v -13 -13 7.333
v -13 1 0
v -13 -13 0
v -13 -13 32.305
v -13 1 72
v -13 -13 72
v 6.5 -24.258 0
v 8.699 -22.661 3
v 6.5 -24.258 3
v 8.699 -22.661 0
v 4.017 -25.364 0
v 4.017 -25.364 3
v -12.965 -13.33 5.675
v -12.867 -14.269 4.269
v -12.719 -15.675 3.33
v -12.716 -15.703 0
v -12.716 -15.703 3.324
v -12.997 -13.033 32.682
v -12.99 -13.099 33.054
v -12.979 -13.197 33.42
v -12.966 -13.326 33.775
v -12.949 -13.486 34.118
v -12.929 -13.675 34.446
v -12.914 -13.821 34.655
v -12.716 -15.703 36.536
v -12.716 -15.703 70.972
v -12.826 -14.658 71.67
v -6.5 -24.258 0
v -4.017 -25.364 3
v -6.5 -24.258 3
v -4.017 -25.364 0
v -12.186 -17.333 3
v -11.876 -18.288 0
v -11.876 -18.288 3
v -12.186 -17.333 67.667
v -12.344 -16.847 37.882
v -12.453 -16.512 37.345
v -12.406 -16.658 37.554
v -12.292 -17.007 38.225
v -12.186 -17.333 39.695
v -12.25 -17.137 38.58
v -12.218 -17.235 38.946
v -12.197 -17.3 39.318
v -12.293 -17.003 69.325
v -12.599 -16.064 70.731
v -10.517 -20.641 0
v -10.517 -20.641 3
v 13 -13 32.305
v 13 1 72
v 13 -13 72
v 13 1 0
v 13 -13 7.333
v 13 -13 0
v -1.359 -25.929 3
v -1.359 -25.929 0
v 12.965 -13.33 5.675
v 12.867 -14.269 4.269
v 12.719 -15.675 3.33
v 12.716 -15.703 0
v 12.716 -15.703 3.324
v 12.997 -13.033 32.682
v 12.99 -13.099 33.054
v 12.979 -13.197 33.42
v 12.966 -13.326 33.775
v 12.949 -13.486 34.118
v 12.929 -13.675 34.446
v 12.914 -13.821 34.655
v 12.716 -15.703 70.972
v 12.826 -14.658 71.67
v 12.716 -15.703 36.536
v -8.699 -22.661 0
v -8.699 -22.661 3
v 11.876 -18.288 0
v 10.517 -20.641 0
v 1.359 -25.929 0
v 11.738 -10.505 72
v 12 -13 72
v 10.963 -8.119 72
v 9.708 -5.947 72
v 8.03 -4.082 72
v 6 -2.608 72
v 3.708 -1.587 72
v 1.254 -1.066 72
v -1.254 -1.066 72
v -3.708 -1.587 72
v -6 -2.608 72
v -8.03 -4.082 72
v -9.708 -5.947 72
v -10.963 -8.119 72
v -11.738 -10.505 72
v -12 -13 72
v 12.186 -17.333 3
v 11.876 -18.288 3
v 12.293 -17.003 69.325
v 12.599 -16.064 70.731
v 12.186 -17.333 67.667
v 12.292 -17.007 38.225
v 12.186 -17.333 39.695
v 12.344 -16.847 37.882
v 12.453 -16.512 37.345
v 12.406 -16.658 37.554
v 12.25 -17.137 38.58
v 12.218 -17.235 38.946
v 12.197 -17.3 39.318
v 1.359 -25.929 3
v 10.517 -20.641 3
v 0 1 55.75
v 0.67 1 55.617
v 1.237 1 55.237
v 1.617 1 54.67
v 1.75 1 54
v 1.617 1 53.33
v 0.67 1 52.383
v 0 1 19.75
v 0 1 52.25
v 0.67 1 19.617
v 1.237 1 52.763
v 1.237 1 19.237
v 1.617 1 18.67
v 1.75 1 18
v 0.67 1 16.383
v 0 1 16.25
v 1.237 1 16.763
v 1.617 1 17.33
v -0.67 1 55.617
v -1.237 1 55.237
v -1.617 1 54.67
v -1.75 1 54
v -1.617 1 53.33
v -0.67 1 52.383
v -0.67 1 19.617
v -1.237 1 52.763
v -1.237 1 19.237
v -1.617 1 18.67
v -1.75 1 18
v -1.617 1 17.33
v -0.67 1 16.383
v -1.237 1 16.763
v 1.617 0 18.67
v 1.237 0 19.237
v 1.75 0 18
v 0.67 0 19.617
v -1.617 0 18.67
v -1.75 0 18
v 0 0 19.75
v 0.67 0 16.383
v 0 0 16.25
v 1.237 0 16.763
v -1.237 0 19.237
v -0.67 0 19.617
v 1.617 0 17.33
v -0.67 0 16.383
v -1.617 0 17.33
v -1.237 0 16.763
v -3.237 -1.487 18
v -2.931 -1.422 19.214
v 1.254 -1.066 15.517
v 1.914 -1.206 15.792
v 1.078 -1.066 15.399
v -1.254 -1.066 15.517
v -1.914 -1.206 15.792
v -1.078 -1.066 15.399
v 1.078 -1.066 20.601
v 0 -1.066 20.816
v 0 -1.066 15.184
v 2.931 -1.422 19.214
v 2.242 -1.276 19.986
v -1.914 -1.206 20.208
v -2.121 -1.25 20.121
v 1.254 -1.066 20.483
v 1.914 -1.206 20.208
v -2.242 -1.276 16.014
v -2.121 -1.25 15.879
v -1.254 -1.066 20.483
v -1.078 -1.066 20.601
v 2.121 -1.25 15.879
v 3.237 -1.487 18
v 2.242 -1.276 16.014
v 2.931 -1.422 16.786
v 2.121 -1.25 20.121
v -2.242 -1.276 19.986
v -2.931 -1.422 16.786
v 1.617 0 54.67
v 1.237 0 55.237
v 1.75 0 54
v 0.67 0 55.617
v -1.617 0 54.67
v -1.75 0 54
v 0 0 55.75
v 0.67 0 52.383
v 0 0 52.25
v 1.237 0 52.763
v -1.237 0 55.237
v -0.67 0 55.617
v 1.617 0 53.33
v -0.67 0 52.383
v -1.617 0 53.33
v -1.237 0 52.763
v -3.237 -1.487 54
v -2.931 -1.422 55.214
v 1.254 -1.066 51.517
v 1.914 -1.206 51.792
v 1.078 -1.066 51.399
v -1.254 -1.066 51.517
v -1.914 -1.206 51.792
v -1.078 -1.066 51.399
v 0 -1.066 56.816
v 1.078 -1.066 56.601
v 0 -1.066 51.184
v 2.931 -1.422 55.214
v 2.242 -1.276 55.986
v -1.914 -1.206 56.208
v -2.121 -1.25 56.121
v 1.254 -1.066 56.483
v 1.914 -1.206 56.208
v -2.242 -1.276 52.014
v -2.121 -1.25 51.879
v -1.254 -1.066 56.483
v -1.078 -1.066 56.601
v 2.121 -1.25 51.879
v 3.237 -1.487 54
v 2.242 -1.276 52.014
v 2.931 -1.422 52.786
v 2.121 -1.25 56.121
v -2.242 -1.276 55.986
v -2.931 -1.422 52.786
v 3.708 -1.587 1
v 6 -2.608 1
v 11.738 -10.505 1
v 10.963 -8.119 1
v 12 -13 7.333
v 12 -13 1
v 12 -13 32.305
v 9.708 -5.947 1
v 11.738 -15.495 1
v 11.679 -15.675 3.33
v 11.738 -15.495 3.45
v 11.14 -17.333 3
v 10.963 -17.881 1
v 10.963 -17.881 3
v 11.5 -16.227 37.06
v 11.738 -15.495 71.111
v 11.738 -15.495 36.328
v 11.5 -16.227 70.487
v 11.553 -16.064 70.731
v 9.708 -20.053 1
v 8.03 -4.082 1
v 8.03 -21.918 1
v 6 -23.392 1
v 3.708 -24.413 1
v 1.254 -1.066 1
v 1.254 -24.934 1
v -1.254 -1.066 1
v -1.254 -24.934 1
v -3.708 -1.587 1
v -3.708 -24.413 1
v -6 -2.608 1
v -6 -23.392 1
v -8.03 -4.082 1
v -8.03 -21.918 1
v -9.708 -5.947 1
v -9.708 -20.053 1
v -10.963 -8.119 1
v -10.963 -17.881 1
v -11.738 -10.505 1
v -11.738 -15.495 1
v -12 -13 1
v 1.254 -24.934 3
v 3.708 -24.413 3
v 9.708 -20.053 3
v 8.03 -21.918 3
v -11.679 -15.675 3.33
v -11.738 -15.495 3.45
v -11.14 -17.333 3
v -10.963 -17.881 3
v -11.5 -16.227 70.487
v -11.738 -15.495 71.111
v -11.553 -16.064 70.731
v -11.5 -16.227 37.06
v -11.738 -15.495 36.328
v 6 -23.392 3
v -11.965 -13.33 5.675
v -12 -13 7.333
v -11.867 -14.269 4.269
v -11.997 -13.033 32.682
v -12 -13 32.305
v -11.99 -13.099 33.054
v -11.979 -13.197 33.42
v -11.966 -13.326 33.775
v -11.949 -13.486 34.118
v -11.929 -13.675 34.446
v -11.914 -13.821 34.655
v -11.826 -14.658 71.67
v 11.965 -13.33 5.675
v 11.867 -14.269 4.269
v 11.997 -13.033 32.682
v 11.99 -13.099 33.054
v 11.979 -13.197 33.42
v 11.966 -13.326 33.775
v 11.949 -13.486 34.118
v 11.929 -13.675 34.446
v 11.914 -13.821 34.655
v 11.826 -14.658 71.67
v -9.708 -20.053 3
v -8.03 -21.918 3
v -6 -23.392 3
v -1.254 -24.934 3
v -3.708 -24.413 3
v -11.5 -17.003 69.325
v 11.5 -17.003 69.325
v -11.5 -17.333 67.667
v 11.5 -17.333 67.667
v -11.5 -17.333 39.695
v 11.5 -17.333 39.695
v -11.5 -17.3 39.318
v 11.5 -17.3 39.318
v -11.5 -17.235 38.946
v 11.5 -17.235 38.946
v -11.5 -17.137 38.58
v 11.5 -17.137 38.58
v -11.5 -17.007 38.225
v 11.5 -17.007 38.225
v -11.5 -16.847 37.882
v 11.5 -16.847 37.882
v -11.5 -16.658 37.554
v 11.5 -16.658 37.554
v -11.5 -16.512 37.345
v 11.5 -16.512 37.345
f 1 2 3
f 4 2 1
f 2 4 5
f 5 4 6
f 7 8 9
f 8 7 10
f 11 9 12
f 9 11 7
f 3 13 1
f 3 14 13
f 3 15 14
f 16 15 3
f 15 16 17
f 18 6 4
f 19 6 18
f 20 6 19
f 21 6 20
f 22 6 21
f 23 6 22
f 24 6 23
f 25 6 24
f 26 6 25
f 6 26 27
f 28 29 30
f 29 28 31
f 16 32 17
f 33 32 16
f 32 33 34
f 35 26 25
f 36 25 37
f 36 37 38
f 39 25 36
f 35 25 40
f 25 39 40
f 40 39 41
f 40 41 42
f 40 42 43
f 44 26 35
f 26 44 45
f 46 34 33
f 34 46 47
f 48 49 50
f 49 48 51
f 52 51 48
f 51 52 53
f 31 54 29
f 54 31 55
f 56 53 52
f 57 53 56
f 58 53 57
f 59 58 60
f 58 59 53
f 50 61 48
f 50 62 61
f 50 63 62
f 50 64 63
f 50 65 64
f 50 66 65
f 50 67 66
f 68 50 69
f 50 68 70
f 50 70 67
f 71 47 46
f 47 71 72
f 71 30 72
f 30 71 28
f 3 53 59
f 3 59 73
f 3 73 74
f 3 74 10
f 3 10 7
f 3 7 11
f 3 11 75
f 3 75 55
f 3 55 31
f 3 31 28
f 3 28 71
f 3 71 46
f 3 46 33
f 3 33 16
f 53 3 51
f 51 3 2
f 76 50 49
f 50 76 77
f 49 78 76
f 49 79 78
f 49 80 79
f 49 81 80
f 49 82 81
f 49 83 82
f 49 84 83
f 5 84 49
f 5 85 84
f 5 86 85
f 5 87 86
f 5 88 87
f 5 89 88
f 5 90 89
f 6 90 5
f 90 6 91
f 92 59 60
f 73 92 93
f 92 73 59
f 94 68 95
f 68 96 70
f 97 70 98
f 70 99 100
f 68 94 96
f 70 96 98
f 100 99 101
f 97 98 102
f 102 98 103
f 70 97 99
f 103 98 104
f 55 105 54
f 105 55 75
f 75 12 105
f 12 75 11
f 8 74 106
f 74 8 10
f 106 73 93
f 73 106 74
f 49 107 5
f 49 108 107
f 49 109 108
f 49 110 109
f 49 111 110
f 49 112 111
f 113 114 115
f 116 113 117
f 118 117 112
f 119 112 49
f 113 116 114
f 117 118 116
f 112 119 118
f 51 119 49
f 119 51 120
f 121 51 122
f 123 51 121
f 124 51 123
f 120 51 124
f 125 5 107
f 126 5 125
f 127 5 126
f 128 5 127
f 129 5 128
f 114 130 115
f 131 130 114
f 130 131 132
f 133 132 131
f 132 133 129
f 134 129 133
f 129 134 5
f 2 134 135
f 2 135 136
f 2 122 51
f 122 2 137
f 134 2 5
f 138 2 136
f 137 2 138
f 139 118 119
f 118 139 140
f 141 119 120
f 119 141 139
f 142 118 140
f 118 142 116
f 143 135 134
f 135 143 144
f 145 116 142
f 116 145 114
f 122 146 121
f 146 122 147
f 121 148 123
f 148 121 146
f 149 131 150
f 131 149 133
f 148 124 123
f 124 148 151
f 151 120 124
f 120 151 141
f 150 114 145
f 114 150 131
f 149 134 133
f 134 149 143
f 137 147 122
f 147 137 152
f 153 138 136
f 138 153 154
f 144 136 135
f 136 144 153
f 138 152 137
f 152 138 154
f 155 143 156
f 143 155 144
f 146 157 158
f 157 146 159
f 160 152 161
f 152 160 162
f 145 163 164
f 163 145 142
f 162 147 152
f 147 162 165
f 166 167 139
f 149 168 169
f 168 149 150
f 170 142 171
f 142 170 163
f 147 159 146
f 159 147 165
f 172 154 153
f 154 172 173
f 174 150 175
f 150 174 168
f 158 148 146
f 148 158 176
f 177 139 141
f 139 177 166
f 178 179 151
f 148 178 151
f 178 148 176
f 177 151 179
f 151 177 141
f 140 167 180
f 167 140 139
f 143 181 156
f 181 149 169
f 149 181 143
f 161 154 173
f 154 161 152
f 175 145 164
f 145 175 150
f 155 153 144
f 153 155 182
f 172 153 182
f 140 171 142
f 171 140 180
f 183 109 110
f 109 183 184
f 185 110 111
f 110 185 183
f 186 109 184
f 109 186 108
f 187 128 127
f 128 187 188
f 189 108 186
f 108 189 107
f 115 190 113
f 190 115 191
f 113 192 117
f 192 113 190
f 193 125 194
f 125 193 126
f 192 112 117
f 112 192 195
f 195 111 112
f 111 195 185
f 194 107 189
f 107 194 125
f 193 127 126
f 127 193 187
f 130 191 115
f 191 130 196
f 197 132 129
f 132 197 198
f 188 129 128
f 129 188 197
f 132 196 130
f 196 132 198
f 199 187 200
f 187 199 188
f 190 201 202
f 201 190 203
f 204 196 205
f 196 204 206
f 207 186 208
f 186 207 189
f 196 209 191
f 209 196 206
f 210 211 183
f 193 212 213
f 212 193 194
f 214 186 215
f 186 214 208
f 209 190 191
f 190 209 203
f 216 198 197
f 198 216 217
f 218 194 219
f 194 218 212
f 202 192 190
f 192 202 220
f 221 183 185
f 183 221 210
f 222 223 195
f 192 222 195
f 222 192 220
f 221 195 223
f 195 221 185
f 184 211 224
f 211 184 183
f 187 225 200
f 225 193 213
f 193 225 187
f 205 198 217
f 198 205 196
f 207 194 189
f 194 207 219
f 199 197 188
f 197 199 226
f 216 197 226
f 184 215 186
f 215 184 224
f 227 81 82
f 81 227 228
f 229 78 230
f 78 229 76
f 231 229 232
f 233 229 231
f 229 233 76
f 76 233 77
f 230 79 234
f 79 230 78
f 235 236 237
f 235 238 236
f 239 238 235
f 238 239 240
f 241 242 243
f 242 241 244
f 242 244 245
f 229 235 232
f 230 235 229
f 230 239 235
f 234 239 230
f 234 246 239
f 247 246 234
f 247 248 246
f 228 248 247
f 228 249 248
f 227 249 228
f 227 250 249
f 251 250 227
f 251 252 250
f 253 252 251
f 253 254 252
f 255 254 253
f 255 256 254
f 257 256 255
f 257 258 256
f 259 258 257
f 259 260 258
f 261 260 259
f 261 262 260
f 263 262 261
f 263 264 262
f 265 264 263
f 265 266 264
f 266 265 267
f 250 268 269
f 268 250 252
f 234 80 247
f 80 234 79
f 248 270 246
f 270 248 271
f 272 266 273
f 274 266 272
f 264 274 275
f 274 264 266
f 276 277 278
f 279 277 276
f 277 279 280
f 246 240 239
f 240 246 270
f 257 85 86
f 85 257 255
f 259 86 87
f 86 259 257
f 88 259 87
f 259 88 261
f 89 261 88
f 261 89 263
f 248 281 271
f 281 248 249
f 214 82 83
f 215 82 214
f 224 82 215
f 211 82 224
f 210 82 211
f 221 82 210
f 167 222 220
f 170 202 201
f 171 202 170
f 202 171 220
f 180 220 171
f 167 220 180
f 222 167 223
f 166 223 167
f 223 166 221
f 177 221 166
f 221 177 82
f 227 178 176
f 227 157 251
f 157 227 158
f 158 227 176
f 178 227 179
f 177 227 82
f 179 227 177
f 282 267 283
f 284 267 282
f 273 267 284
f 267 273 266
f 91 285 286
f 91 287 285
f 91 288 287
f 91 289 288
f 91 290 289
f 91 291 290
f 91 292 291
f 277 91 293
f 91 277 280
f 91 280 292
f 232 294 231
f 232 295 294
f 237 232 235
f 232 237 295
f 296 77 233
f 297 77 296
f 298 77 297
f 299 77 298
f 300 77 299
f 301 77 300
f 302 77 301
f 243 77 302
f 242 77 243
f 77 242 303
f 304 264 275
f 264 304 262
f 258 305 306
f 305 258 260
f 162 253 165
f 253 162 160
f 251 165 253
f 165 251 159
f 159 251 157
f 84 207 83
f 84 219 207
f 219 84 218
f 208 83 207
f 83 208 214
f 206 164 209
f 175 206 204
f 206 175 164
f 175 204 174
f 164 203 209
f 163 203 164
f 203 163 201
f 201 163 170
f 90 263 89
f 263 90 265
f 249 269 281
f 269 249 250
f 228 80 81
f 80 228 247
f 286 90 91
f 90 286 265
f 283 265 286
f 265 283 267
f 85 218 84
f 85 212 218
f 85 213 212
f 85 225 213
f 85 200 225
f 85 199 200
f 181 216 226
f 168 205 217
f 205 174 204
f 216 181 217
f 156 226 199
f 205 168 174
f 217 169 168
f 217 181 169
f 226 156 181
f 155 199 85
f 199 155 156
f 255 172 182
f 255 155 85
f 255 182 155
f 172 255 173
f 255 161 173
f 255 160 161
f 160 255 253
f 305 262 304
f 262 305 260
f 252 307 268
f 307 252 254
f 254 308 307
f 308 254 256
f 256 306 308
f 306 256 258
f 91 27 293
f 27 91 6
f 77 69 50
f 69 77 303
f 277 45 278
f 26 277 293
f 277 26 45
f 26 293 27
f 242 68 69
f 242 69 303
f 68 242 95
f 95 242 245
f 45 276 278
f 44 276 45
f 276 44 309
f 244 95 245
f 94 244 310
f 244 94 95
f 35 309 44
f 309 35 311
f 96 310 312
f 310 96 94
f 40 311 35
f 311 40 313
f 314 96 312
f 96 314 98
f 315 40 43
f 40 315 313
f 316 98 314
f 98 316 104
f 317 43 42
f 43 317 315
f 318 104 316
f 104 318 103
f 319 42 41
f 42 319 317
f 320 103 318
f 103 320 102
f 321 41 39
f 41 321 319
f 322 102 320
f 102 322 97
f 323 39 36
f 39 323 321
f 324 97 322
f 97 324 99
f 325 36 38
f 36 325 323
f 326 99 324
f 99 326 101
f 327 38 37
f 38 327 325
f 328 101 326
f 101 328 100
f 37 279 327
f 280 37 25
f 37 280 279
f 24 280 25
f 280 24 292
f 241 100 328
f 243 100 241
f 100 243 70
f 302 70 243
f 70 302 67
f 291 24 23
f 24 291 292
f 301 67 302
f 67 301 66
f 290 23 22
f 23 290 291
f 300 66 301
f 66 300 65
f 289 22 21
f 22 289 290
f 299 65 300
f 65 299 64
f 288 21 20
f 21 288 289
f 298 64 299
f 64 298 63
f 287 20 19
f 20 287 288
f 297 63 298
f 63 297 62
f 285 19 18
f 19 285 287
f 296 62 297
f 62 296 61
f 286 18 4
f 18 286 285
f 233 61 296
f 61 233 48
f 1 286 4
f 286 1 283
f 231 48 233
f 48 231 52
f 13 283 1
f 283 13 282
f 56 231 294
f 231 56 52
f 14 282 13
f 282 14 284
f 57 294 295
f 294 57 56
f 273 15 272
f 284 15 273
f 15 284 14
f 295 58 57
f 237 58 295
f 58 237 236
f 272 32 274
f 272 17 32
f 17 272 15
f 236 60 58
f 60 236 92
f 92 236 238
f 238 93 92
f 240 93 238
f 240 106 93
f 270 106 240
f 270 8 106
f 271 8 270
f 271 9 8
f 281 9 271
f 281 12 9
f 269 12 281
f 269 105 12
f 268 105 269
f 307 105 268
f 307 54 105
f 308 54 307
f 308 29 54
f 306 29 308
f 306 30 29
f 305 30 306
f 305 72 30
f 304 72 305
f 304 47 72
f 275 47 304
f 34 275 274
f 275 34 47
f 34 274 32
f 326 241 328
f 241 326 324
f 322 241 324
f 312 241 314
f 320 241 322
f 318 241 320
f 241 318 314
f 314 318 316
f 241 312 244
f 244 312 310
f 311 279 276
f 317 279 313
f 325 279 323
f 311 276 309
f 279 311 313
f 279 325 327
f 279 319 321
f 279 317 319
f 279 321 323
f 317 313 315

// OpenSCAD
//Diameter of cigarette
cigarete_diameter = 24; //[10:30]

//Length of holder
holder_length = 70; //[40:100]

//Thikness of holder walls
wall_thikness = 1; //[1:3]

//Mount holes diameter
holes_diameter = 3.5; //[2:5]

// in n*wall_thikness
//angle_round = 3; //[1-6]


/*[Hidden]*/
ed=cigarete_diameter;
el=holder_length;
w=wall_thikness;
//dr=angle_round;

m4d = holes_diameter;


tw = ed+w*2;
tl = el+w*2;
dn_h = w*3;
up_h = w*6;
b_dpth = tw/2;


holder();


module shape5(){
	x1 = tw; 
	x2 = b_dpth;
	x3 = tw*2/3;
	r1 = x3-x2;
	r2 = r1/2;
	dr = (x3-x2)/2;
	r = r1;
	y1 = dn_h;
	y2 = tl/2;
	y4 = tl;
	union(){
		difference(){
			polygon(points=[
				[x1,y1],[x2+r,y1],[x2,y1+r],[x2,y2-r/2],[x3,y2+r/2],[x3,y4-r],[x2,y4],[x2,y4+1],[x1,y4+1]
				],path=[0,1,2,3,4,5,6,7,8]
			);
			translate([x2+r,y2-r+(r/2)/sqrt(2)-r/4])
				for(i=[0:5:45]){
					rotate([0,0,-i])
						translate([-r-r/4,0])
							square([r/2,r],true);
			}
			translate([x2,y4-r])
				circle(r, $fn=16);
		}
		translate([x2+r,y1+r])
			circle(r, $fn=16);
		for(i=[0:5:45]){
			translate([x3-r,y2+r-(r/2)/sqrt(2)+r/4])
				rotate([0,0,-i])
					translate([r+r/4,0])
						square([r/2,r],true);
		}
	}
}



module shape(){
//	hull()
	difference(){
		square([tw,tl]);
		shape2();
	}
}

module holder(){
	translate([0,-tw/4,0])
		difference(){
			union(){
				linear_extrude(height=tl, convexity = 2){
					square([tw,tw/2],true);
					translate([0,-tw/4])
						circle(r=tw/2);		
				}
				translate([-tw/2,tw/4,0])
					cube([tw,w,tl]);			
			}
			translate([0,-tw/4,w])
				cylinder(r=ed/2,h=tl);
	//		translate([-tw/2-1,-tw,w*3])
	//			#cube([tw+2,tw,tl*3/4]);
			rotate([90,0,-90])
				translate([-tw/4,0,-tw/2-1])
				linear_extrude(height=tw+2, convexity = 2)
					shape5();
			for(i=[tl/4,tl*3/4])
				translate([0,tw/4,i])
					rotate([90,0,0])
						hole(m4d);
			assign(lnth=ed-w)
			translate([-lnth/2,-tw*3/4,tl/3])
				cube([lnth,tw/2,tl*2/3+1]);
		}
}

module hole(diam){
	l1=w*5;
	l2=diam/2;
	l3=w*5;
	translate([0,0,-l1])
		cylinder(r=diam/2, h=l1+1, $fn=16);
	translate([0,0,0])
		cylinder(r1=diam/2, r2=diam, h=l2, $fn=16);
	translate([0,0,l2])
		cylinder(r=diam, h=l3, $fn=16);
}
